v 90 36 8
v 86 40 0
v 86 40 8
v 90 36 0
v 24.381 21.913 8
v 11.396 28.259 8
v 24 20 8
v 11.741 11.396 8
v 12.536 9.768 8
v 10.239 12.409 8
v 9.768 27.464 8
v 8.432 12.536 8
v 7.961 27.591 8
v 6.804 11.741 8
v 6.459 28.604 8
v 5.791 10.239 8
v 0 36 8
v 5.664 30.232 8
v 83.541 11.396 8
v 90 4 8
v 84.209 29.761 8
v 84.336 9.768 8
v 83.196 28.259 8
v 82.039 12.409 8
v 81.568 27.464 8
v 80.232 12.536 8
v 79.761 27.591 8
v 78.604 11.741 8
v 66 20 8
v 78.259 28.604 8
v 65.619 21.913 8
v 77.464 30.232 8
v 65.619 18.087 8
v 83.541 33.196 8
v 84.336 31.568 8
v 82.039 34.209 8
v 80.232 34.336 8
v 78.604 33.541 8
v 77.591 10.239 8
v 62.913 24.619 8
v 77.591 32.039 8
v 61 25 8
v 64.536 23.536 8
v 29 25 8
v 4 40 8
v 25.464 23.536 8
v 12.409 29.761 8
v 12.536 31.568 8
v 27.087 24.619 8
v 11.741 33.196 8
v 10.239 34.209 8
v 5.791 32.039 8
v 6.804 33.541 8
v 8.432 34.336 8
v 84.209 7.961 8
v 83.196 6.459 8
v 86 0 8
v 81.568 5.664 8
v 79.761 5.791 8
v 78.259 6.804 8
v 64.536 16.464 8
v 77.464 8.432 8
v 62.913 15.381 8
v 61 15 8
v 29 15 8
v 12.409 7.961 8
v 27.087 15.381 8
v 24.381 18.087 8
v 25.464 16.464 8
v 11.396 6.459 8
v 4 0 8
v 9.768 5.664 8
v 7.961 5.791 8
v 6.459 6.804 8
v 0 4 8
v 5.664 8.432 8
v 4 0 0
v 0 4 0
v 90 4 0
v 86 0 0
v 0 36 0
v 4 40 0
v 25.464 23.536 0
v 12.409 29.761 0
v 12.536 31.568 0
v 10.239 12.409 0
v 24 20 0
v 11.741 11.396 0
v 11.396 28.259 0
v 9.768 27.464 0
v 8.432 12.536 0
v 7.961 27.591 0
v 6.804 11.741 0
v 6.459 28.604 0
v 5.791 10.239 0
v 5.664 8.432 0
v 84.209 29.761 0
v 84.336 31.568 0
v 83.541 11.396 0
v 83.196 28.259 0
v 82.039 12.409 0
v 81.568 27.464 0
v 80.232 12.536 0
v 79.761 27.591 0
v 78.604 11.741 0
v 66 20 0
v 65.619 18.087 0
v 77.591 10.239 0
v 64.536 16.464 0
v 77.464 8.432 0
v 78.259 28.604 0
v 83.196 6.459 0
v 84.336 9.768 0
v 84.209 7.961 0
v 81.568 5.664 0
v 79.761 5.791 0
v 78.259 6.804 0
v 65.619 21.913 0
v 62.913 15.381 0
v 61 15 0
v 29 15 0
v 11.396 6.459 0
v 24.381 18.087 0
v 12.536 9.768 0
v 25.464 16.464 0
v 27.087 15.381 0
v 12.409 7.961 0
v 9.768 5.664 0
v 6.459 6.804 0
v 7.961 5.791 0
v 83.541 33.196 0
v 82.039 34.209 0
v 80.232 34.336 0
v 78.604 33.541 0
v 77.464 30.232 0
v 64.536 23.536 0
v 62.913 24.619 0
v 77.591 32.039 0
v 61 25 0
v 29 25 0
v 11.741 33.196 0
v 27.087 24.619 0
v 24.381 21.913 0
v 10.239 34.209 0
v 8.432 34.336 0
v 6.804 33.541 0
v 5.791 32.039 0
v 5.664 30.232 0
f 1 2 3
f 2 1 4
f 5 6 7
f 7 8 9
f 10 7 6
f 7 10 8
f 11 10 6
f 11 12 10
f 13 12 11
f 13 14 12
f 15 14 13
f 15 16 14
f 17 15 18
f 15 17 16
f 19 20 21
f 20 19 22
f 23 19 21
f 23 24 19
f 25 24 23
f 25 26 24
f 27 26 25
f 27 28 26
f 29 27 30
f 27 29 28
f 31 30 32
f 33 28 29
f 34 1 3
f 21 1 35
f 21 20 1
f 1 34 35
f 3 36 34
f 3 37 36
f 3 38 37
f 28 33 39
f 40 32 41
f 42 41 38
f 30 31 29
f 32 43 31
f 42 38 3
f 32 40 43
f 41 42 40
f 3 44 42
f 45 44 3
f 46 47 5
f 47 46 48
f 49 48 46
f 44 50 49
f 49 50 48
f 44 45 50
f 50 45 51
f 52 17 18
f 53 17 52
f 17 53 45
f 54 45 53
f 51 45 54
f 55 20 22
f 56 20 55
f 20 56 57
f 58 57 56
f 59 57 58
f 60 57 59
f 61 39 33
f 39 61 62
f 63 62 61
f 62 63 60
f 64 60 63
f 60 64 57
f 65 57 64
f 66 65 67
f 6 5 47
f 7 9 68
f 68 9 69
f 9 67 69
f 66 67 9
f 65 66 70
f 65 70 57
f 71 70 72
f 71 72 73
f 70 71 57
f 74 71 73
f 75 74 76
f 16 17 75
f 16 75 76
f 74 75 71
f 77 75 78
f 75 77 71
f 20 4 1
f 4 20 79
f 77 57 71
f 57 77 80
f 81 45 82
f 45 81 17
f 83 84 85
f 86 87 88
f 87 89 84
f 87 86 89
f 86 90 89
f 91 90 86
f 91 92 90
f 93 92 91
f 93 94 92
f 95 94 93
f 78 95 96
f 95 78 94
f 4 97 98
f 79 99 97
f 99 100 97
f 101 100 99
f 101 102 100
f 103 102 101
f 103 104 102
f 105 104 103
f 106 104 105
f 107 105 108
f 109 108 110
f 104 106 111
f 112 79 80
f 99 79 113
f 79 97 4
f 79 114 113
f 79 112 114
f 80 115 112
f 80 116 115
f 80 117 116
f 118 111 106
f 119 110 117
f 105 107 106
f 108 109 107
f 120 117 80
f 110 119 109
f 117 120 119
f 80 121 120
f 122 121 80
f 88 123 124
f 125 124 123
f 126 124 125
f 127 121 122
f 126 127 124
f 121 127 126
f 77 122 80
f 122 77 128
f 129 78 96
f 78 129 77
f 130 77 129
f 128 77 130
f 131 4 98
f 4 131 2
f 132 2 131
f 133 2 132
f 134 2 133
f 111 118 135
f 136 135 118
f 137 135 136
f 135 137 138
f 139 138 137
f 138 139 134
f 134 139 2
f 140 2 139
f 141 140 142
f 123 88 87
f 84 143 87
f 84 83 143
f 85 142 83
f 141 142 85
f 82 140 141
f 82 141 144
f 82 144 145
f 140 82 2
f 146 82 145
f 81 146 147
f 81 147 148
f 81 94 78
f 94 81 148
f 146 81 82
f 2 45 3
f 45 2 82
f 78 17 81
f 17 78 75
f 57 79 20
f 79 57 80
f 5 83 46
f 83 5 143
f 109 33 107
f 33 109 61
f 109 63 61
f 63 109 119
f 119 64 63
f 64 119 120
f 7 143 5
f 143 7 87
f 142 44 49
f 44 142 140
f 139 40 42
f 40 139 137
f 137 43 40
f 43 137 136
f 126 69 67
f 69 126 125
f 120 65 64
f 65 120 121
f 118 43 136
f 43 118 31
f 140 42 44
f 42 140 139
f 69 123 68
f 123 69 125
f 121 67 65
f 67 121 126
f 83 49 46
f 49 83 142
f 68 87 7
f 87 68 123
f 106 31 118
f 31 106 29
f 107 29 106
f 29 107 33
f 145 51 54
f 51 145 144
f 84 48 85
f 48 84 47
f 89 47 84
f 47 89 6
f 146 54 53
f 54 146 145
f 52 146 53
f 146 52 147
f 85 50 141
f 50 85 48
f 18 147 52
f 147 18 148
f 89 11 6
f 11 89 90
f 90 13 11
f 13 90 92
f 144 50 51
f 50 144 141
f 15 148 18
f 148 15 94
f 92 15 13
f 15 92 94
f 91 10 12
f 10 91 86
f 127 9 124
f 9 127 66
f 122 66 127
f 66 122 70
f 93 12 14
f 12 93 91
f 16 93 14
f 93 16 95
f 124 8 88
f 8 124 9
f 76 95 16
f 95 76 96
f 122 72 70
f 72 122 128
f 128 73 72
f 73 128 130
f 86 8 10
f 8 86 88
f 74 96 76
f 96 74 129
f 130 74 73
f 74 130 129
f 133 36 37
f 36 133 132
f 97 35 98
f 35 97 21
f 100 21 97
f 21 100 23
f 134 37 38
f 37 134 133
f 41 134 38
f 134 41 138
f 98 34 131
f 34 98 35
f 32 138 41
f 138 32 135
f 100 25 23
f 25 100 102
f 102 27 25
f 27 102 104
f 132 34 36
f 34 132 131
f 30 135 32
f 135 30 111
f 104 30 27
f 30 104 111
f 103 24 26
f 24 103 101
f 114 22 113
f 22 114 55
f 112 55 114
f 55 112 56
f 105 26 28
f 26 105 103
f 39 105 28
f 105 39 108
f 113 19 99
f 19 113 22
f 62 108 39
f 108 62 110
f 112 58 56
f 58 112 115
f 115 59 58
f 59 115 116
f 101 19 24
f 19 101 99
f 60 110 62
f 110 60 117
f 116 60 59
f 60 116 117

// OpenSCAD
$fn = 32;

// ----------------------------------------------------------------------
// Bracket plate: slot plate 90 x 40
// ----------------------------------------------------------------------

// --- parameters (mm) ---
hole_r = 3.5;             // bolt hole radius
plate_t = 8;              // plate thickness, Z (extrusion height)
plate_l = 90;             // plate length
plate_w = 40;             // plate width
slot_l = 32;              // slot straight length
slot_r = 5;               // slot end radius

slot_len = slot_l + 2 * slot_r;
slot_w = 2 * slot_r;
hole_d2 = 2 * hole_r;

profile = [[4, 0], [86, 0], [90, 4], [90, 36], [86, 40], [4, 40], [0, 36], [0, 4]];  // primary outline, 8 points, counter clockwise
void_1 = [[61, 15], [62.913, 15.381], [64.536, 16.464], [65.619, 18.087], [66, 20], [65.619, 21.913], [64.536, 23.536], [62.913, 24.619], [61, 25], [29, 25], [27.087, 24.619], [25.464, 23.536], [24.381, 21.913], [24, 20], [24.381, 18.087], [25.464, 16.464], [27.087, 15.381], [29, 15]];  // grip slot, 18 points
void_2 = [[12.536, 31.568], [11.741, 33.196], [10.239, 34.209], [8.432, 34.336], [6.804, 33.541], [5.791, 32.039], [5.664, 30.232], [6.459, 28.604], [7.961, 27.591], [9.768, 27.464], [11.396, 28.259], [12.409, 29.761]];  // corner hole, 12 points
void_3 = [[12.536, 9.768], [11.741, 11.396], [10.239, 12.409], [8.432, 12.536], [6.804, 11.741], [5.791, 10.239], [5.664, 8.432], [6.459, 6.804], [7.961, 5.791], [9.768, 5.664], [11.396, 6.459], [12.409, 7.961]];  // corner hole, 12 points
void_4 = [[84.336, 31.568], [83.541, 33.196], [82.039, 34.209], [80.232, 34.336], [78.604, 33.541], [77.591, 32.039], [77.464, 30.232], [78.259, 28.604], [79.761, 27.591], [81.568, 27.464], [83.196, 28.259], [84.209, 29.761]];  // corner hole, 12 points
void_5 = [[84.336, 9.768], [83.541, 11.396], [82.039, 12.409], [80.232, 12.536], [78.604, 11.741], [77.591, 10.239], [77.464, 8.432], [78.259, 6.804], [79.761, 5.791], [81.568, 5.664], [83.196, 6.459], [84.209, 7.961]];  // corner hole, 12 points

// --- the one profile operation ---
difference() {
  linear_extrude(height = plate_t) polygon(points = profile);
  translate([0, 0, -1])
    linear_extrude(height = plate_t + 2) polygon(points = void_1);
  translate([0, 0, -1])
    linear_extrude(height = plate_t + 2) polygon(points = void_2);
  translate([0, 0, -1])
    linear_extrude(height = plate_t + 2) polygon(points = void_3);
  translate([0, 0, -1])
    linear_extrude(height = plate_t + 2) polygon(points = void_4);
  translate([0, 0, -1])
    linear_extrude(height = plate_t + 2) polygon(points = void_5);
}
